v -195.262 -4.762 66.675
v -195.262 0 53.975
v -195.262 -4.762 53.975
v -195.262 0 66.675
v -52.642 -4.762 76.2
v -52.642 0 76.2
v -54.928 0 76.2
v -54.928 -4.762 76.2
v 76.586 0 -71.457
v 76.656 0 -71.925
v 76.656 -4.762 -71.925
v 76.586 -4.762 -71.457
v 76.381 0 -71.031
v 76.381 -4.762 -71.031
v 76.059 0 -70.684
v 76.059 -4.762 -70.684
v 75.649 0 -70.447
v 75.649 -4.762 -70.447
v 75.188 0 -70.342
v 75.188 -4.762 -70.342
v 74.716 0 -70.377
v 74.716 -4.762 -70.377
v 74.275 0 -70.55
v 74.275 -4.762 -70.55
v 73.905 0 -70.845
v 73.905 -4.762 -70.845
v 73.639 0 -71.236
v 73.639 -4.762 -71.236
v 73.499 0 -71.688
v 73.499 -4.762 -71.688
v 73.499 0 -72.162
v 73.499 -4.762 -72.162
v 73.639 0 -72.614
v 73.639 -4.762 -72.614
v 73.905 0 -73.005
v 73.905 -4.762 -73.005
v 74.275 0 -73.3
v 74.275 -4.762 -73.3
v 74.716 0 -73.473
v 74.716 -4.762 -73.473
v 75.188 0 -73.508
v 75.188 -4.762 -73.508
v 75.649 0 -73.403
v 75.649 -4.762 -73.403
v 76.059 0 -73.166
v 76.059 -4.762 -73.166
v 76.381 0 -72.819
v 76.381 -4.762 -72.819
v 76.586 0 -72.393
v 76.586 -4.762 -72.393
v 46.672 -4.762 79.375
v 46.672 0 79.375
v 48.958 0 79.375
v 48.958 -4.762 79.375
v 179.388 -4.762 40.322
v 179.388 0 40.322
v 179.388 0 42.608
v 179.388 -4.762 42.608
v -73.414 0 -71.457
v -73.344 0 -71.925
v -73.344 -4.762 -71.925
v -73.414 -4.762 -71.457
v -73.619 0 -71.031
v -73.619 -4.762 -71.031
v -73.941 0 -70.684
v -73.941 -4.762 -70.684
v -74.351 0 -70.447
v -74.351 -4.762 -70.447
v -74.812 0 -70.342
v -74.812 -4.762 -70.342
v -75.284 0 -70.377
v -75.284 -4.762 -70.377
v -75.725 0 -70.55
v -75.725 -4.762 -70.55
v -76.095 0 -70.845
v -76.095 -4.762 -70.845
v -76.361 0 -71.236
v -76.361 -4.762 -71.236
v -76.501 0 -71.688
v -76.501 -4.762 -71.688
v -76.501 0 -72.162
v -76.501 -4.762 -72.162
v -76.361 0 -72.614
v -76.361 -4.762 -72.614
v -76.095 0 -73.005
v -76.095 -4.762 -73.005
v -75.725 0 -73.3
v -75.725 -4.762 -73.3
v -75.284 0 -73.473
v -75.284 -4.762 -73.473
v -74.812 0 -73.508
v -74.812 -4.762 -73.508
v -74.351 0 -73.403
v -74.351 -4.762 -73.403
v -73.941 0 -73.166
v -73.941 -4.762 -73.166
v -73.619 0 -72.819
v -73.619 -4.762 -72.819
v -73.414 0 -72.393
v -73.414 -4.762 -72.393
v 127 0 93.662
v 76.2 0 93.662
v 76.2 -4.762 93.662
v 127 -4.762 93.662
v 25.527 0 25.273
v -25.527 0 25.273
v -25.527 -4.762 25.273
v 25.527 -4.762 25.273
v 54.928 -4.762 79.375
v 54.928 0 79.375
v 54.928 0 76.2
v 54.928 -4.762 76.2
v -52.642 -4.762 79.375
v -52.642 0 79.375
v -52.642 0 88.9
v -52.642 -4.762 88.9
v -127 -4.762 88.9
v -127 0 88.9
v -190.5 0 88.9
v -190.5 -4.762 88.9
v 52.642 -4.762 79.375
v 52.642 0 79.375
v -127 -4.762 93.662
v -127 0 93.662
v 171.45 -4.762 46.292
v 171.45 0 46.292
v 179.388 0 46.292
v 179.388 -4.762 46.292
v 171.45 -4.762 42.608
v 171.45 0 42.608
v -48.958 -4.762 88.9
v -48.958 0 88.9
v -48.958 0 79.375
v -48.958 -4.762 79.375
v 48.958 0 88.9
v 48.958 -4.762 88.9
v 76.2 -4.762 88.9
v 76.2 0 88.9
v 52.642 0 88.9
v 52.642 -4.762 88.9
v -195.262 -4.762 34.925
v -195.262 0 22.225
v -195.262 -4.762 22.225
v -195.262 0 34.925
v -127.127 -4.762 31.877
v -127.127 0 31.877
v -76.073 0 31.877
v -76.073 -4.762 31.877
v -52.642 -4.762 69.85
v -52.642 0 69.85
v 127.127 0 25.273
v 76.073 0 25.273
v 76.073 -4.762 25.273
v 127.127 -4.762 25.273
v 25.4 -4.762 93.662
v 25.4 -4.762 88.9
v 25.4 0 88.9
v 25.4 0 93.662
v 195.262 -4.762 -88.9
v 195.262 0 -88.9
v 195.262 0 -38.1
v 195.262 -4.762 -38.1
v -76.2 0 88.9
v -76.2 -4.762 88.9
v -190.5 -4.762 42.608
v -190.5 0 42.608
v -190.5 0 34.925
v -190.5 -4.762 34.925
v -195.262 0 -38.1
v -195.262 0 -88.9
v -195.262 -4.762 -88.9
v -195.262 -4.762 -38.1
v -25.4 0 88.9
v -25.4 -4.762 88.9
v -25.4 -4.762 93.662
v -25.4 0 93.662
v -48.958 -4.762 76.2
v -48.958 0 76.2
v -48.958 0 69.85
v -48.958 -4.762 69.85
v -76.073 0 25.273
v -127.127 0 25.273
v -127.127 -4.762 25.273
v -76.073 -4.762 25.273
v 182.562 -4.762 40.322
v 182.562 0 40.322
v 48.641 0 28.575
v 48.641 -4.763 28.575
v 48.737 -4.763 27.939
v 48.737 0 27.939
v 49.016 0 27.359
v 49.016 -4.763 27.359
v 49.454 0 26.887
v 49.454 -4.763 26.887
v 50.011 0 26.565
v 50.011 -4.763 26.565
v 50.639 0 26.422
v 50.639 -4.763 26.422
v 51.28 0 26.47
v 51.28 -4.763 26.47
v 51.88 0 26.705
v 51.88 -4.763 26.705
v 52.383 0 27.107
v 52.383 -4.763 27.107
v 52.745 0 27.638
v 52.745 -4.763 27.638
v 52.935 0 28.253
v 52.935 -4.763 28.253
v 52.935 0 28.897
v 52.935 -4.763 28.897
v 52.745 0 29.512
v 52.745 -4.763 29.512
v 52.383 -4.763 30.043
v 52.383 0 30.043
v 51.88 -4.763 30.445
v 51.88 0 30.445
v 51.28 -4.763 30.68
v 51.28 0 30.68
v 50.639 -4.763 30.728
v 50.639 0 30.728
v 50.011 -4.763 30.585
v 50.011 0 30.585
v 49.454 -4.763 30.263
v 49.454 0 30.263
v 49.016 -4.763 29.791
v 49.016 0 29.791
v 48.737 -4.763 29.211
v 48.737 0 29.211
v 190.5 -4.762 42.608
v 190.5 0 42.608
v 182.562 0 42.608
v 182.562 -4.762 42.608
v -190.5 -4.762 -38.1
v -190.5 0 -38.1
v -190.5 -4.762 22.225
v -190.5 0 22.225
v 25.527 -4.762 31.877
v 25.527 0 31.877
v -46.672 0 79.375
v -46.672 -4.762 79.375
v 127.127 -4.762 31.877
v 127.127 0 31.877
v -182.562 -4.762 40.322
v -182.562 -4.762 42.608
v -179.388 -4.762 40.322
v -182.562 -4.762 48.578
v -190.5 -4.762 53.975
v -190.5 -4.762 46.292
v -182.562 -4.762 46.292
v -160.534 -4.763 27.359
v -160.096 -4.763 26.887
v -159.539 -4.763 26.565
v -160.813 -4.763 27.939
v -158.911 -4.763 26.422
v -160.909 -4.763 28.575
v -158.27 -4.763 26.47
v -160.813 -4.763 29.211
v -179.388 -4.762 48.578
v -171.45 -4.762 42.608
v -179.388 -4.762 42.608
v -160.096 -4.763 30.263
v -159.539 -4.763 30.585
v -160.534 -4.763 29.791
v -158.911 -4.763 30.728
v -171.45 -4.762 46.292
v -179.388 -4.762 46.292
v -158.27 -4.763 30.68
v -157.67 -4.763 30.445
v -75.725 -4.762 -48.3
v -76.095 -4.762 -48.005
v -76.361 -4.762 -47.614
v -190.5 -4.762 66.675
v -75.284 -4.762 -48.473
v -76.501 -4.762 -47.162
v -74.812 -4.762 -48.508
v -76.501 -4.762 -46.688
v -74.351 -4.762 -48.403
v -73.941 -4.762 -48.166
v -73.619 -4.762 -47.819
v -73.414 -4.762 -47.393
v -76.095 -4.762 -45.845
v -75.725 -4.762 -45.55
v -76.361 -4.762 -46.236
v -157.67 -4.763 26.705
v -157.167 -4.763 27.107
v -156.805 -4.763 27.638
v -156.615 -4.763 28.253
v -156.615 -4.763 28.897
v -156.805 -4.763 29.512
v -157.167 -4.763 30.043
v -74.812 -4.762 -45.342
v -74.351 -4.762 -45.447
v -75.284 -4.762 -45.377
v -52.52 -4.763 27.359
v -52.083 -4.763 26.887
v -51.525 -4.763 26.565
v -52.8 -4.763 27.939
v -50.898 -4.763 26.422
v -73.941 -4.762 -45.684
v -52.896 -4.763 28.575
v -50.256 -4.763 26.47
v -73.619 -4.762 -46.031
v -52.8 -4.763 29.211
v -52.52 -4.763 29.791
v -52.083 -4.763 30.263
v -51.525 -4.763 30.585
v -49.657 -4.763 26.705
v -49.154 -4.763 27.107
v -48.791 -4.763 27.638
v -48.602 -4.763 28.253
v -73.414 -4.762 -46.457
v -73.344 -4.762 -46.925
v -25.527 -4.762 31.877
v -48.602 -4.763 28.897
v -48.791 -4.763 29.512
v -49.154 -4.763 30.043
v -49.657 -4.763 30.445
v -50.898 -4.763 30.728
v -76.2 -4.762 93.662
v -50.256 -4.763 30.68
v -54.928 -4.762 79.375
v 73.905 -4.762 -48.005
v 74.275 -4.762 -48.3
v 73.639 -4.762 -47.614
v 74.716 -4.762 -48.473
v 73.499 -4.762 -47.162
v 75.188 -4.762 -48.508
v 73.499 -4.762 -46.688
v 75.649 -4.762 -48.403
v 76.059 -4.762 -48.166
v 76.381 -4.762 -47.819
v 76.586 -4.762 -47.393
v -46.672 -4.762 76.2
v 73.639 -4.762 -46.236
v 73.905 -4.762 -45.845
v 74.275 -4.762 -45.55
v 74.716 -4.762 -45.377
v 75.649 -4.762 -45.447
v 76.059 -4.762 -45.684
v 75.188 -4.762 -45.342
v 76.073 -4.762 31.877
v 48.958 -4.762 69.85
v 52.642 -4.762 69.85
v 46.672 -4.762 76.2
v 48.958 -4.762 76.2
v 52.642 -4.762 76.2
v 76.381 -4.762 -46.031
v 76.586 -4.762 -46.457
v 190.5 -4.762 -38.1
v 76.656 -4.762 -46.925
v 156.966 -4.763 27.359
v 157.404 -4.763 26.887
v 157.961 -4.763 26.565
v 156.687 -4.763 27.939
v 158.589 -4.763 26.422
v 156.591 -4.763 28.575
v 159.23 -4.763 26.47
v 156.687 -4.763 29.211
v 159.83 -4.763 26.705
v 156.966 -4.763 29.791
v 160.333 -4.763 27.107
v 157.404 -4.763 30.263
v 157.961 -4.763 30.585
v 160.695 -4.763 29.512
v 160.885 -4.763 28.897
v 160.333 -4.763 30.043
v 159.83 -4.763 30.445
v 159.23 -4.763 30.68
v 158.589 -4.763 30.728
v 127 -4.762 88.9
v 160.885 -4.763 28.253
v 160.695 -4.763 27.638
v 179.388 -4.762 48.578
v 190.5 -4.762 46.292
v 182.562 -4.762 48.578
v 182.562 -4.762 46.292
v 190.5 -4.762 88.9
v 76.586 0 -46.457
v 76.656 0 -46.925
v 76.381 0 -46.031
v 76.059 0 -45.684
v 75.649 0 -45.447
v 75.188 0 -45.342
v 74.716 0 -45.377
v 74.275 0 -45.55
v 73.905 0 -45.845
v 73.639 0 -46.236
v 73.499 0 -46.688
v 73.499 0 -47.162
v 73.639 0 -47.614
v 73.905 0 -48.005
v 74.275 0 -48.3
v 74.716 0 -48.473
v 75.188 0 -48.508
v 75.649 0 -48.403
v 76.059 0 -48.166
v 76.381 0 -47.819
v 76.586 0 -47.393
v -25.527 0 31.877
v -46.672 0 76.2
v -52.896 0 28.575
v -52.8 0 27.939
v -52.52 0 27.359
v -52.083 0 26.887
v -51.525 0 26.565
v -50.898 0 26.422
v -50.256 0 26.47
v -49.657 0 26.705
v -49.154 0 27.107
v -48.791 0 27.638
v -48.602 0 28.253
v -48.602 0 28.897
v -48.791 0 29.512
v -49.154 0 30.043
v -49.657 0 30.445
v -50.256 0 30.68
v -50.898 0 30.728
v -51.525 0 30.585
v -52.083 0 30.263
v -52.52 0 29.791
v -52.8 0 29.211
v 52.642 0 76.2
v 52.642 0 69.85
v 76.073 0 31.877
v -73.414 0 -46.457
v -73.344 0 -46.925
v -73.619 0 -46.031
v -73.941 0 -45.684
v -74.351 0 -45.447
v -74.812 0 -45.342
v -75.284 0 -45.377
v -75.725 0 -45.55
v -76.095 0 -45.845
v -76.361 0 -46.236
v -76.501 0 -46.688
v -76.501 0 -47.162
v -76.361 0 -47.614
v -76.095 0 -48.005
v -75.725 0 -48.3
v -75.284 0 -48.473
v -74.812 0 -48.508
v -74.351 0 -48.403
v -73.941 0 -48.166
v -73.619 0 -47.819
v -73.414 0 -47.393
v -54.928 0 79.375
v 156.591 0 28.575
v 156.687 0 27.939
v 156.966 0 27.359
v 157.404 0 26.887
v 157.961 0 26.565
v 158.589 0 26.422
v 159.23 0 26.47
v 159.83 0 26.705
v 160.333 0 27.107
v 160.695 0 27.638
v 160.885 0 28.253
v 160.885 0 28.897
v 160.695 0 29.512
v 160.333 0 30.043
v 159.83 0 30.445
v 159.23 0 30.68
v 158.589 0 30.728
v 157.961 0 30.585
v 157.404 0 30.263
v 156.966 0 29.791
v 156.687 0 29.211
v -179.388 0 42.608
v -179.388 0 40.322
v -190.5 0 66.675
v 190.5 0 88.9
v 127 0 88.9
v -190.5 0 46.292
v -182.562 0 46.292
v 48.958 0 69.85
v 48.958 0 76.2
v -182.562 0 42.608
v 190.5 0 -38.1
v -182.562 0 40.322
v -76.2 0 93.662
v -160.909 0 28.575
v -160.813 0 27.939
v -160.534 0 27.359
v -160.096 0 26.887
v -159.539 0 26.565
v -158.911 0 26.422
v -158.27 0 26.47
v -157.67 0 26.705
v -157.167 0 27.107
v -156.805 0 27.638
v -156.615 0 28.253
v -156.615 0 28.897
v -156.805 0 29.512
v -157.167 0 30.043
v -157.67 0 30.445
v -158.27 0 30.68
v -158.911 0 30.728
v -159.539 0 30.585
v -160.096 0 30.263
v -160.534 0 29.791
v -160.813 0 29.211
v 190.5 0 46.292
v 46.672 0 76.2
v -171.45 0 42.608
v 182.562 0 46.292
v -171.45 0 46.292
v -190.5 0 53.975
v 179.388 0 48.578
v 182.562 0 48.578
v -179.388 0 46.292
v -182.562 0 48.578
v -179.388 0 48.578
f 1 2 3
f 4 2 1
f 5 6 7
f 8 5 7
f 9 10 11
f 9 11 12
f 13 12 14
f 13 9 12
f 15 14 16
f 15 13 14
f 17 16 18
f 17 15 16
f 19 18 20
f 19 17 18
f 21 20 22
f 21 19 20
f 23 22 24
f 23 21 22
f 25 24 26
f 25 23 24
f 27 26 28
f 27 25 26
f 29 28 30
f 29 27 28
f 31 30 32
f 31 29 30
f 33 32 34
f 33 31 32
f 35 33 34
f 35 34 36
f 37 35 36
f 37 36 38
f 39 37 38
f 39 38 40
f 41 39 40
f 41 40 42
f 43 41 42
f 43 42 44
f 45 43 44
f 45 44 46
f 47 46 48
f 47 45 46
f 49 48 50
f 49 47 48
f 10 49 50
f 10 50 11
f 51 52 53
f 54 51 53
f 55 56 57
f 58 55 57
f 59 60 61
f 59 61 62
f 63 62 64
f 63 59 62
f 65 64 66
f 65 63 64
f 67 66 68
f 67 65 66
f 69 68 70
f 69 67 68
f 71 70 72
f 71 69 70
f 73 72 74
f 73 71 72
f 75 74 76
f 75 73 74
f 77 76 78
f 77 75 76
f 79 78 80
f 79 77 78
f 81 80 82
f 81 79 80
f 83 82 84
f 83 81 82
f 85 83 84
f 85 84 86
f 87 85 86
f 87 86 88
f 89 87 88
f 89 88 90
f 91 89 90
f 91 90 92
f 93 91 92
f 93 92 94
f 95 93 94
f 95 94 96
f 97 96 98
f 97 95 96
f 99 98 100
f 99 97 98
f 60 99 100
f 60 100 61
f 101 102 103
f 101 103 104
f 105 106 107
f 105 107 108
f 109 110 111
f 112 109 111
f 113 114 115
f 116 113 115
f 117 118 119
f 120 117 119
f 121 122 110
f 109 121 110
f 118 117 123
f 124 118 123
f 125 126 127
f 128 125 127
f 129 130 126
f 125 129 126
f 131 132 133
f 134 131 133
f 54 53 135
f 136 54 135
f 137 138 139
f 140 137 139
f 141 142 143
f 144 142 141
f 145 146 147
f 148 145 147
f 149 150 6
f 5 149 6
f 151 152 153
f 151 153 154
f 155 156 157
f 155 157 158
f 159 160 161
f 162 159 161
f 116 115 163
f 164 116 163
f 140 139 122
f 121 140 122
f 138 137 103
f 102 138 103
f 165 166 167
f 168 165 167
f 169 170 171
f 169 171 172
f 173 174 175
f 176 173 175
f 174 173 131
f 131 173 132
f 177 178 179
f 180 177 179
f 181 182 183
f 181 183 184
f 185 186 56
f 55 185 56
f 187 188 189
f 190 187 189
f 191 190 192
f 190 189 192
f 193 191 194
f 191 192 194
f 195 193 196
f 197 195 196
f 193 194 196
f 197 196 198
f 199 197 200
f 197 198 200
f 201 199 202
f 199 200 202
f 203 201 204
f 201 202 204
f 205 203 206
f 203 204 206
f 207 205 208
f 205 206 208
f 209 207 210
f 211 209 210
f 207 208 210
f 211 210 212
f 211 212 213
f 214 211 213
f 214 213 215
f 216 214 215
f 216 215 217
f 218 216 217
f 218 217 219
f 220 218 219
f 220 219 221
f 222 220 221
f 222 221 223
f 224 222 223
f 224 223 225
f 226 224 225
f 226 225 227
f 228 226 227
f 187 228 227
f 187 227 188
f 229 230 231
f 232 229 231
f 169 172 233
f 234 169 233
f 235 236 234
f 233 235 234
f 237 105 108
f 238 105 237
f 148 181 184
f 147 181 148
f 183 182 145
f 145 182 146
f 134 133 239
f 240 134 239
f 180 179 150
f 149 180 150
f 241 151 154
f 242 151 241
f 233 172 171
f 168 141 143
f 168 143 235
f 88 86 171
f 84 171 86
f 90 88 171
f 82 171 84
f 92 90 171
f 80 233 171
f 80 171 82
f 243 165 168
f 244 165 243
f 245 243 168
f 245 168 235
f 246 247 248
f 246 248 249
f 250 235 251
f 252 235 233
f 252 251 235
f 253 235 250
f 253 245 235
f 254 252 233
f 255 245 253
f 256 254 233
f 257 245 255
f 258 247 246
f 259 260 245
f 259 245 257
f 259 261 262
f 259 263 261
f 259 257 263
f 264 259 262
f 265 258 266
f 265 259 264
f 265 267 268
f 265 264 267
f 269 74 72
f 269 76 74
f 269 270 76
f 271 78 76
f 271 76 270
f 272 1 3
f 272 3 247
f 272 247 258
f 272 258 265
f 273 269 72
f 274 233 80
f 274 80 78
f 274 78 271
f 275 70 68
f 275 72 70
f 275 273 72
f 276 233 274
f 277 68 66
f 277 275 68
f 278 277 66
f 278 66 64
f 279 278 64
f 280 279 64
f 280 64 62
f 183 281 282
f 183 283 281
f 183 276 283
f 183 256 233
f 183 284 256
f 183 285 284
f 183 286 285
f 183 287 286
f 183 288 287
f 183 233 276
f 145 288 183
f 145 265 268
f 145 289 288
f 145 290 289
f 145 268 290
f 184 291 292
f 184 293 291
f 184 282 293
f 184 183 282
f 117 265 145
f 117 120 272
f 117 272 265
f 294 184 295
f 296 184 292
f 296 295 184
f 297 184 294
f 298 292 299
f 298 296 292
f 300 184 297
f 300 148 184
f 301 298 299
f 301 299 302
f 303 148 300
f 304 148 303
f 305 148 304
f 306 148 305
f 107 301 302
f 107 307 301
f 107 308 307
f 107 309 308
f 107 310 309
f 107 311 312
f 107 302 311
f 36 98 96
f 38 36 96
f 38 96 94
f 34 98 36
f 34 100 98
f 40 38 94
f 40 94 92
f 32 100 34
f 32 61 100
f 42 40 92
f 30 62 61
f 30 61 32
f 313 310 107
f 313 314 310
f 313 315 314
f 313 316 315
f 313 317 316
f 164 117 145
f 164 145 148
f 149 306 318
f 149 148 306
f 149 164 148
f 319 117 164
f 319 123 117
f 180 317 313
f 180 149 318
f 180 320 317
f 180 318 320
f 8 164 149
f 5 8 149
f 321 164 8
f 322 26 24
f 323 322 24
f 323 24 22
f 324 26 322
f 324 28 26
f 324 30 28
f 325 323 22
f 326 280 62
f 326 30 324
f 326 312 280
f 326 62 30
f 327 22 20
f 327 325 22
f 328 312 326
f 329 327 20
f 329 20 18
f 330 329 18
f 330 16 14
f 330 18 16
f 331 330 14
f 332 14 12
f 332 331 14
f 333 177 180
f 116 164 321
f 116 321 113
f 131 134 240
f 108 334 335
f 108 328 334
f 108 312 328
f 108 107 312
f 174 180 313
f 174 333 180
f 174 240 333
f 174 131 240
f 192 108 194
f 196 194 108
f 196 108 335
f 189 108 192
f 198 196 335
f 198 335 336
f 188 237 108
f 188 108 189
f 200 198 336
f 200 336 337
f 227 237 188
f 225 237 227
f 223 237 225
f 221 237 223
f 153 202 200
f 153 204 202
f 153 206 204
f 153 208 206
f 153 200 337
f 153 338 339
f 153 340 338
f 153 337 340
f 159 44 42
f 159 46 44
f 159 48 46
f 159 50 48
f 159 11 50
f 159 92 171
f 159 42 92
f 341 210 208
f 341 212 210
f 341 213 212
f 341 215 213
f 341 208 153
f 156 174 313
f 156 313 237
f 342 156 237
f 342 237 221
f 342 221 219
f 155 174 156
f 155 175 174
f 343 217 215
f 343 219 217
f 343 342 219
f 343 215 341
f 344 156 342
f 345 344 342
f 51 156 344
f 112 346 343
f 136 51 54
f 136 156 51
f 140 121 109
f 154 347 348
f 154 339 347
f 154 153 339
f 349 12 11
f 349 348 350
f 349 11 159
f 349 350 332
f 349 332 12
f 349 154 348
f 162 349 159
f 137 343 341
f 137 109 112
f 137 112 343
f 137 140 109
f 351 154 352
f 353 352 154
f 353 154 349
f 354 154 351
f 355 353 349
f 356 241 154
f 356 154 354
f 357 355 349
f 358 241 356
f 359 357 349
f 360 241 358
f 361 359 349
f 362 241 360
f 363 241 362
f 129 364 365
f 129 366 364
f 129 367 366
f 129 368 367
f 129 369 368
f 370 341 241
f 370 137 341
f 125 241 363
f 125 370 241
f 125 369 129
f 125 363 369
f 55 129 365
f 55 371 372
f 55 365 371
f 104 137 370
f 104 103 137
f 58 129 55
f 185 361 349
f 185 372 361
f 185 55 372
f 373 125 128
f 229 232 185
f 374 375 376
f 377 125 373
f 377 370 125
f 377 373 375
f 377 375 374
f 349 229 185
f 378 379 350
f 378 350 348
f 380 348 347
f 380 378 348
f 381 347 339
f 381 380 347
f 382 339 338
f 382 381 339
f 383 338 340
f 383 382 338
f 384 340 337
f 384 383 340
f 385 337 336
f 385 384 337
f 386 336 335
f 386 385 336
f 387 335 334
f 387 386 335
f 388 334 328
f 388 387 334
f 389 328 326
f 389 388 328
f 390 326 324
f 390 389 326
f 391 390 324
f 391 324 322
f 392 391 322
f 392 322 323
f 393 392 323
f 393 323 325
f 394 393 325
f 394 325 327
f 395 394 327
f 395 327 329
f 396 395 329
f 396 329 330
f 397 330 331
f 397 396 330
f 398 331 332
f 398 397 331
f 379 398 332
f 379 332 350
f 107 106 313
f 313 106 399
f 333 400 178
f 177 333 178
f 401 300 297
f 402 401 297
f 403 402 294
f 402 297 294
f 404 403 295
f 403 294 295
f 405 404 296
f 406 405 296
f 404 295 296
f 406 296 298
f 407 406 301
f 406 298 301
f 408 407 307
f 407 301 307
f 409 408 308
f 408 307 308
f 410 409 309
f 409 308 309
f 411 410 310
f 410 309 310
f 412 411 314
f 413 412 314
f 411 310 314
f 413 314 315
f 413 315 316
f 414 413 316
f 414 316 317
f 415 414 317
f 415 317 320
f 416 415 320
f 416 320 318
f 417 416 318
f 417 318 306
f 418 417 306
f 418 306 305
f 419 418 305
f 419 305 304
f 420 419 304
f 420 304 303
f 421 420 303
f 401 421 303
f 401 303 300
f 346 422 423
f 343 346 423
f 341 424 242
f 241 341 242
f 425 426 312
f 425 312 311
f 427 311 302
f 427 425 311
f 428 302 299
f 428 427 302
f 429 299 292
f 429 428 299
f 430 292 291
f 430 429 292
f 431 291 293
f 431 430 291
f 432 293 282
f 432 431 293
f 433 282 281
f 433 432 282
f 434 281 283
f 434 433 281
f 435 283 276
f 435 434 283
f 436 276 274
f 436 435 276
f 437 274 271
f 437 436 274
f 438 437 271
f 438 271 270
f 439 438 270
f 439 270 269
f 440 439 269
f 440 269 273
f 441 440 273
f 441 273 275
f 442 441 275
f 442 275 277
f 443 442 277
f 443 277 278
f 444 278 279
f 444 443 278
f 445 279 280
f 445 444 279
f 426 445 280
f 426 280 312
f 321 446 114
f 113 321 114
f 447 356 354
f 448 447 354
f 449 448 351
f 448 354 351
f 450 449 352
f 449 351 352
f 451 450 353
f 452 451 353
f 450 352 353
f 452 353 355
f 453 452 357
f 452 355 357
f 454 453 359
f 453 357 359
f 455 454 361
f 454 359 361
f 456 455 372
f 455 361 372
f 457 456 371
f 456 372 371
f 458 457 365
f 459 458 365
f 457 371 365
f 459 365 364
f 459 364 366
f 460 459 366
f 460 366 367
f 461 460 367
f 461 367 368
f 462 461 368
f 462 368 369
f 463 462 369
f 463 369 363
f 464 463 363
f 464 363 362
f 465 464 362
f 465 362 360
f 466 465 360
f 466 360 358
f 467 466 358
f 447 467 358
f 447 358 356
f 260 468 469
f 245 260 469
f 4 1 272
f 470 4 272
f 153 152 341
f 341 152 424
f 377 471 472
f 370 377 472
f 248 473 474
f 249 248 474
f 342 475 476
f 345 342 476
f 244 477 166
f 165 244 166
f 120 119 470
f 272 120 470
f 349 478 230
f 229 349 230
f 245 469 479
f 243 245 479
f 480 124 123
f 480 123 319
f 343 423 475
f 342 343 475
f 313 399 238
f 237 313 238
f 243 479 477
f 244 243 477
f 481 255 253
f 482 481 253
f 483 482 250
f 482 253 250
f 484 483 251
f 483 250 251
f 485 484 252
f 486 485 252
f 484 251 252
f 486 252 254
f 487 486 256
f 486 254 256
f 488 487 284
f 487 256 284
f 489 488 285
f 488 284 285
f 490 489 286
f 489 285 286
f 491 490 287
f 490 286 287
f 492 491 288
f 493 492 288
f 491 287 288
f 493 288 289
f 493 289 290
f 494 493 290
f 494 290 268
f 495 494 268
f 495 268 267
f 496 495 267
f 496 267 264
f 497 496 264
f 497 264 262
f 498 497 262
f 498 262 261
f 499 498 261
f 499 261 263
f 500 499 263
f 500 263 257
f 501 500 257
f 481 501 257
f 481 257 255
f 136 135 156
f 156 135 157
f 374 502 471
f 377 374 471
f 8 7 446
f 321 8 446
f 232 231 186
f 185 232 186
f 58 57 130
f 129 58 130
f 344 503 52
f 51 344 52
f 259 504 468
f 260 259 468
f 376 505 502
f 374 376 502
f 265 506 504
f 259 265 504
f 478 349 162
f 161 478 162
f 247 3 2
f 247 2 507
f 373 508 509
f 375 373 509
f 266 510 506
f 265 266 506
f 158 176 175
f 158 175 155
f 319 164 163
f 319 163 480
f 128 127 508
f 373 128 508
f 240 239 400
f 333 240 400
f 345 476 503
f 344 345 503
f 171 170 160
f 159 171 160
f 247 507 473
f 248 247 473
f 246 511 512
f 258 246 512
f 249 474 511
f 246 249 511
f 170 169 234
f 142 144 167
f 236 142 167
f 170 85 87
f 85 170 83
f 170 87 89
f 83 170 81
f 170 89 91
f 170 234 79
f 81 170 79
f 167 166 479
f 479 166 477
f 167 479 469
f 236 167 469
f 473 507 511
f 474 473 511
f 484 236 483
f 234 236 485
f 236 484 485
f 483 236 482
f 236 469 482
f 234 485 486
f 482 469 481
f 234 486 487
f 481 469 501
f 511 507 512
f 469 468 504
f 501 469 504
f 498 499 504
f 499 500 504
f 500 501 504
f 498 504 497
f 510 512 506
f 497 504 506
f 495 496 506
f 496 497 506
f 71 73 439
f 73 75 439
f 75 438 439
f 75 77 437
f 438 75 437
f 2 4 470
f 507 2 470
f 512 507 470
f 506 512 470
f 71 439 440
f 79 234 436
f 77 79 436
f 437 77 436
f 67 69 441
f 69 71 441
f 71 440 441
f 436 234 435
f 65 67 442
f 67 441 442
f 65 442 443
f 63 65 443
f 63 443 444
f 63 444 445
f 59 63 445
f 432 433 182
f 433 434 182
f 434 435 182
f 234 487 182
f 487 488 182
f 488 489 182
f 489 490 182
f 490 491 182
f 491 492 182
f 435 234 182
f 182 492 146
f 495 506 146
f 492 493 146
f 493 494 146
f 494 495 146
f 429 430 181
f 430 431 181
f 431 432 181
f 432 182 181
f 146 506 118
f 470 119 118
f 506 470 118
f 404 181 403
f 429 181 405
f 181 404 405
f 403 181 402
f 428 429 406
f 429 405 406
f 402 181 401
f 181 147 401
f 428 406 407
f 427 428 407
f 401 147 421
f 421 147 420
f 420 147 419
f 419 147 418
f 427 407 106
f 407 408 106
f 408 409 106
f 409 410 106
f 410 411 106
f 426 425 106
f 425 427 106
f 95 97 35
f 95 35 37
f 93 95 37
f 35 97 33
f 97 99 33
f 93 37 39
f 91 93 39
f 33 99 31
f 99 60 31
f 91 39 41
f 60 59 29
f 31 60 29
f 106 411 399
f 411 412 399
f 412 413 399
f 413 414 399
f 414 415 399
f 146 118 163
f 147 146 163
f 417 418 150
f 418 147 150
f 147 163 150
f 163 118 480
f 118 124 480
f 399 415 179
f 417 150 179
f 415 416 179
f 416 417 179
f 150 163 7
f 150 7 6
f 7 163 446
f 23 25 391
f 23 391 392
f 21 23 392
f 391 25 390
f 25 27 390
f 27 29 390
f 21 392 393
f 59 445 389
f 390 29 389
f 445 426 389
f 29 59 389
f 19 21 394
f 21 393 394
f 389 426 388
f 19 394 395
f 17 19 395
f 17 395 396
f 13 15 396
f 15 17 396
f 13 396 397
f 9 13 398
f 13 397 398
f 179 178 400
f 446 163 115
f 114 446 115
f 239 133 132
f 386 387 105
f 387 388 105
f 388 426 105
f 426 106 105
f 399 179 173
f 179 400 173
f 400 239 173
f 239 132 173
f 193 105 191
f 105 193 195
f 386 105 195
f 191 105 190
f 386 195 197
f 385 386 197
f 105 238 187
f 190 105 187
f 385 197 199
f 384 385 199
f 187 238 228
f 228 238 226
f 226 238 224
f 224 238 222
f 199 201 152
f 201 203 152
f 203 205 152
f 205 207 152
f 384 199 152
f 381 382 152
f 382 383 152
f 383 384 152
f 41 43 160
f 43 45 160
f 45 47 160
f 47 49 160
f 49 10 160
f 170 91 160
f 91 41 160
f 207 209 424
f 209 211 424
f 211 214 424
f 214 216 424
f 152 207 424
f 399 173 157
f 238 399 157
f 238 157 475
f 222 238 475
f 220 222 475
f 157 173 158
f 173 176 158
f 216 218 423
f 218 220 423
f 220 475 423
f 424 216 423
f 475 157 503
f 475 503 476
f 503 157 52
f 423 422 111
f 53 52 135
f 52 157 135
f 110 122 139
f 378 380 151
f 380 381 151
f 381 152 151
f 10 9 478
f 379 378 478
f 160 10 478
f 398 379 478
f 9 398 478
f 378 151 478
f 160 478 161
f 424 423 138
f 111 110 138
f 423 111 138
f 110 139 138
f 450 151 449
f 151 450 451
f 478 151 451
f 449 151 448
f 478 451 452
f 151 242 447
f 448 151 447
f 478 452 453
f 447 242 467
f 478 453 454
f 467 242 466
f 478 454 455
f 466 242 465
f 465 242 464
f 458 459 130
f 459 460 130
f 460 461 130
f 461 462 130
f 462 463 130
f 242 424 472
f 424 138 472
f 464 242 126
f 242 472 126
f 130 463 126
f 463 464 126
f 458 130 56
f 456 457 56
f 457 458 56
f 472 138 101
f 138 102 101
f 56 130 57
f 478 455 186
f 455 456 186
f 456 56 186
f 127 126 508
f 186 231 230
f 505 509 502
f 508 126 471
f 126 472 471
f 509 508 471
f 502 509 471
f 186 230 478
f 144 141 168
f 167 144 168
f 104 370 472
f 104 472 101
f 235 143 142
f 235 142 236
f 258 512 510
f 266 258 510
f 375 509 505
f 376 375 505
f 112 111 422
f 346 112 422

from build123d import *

# Parameters (mm, degrees)
F0_R     = 1.5875
F0_W     = 51.054
F0_H     = 6.604
F0_W_2   = 4.7625
F0_H_2   = 50.8
F0_W_3   = 50.8
F0_H_3   = 4.7625
F0_H_4   = 12.7
F1_DEPTH = 4.7625
F2_D     = 4.318
F2_DEPTH = 11.9126
F2_TIP   = 1.2972580765


with BuildPart() as f1:
    # F0 (on Front) → F1 (new body)
    with BuildSketch(Plane.XZ):
        Polygon((-127, 88.9), (-190.5, 88.9), (-190.5, 66.675), (-190.5, 53.975), (-190.5, 46.2915), (-182.5625, 46.2915), (-182.5625, 48.5775), (-179.3875, 48.5775), (-179.3875, 46.2915), (-171.45, 46.2915), (-171.45, 42.6085), (-179.3875, 42.6085), (-179.3875, 40.3225), (-182.5625, 40.3225), (-182.5625, 42.6085), (-190.5, 42.6085), (-190.5, 34.925), (-190.5, 22.225), (-190.5, -38.1), (-190.5, -88.9), (190.5, -88.9), (190.5, -38.1), (190.5, 22.225), (190.5, 34.925), (190.5, 42.6085), (182.5625, 42.6085), (182.5625, 40.3225), (179.3875, 40.3225), (179.3875, 42.6085), (171.45, 42.6085), (171.45, 46.2915), (179.3875, 46.2915), (179.3875, 48.5775), (182.5625, 48.5775), (182.5625, 46.2915), (190.5, 46.2915), (190.5, 53.975), (190.5, 66.675), (190.5, 88.9), (127, 88.9), (76.2, 88.9), (52.6415, 88.9), (52.6415, 79.375), (54.9275, 79.375), (54.9275, 76.2), (52.6415, 76.2), (52.6415, 69.85), (48.9585, 69.85), (48.9585, 76.2), (46.6725, 76.2), (46.6725, 79.375), (48.9585, 79.375), (48.9585, 88.9), (25.4, 88.9), (-25.4, 88.9), (-48.9585, 88.9), (-48.9585, 79.375), (-46.6725, 79.375), (-46.6725, 76.2), (-48.9585, 76.2), (-48.9585, 69.85), (-52.6415, 69.85), (-52.6415, 76.2), (-54.9275, 76.2), (-54.9275, 79.375), (-52.6415, 79.375), (-52.6415, 88.9), (-76.2, 88.9), align=None)
        with Locations((-74.9310097456, -71.9249998569)):
            Circle(F0_R, mode=Mode.SUBTRACT)
        with Locations((-74.9310097456, -46.9249998569)):
            Circle(F0_R, mode=Mode.SUBTRACT)
        with Locations((75.0689902544, -71.9249998569)):
            Circle(F0_R, mode=Mode.SUBTRACT)
        with Locations((75.0689902544, -46.9249998569)):
            Circle(F0_R, mode=Mode.SUBTRACT)
        with Locations((-101.6, 28.575)):
            Rectangle(F0_W, F0_H, mode=Mode.SUBTRACT)
        with Locations((0, 28.575)):
            Rectangle(F0_W, F0_H, mode=Mode.SUBTRACT)
        with Locations((101.6, 28.575)):
            Rectangle(F0_W, F0_H, mode=Mode.SUBTRACT)
        with Locations((192.88125, -63.5)):
            Rectangle(F0_W_2, F0_H_2)
        with Locations((-192.88125, -63.5)):
            Rectangle(F0_W_2, F0_H_2)
        with Locations((-101.6, 91.28125)):
            Rectangle(F0_W_3, F0_H_3)
        with Locations((0, 91.28125)):
            Rectangle(F0_W_3, F0_H_3)
        with Locations((101.6, 91.28125)):
            Rectangle(F0_W_3, F0_H_3)
        with Locations((-192.88125, 60.325)):
            Rectangle(F0_W_2, F0_H_4)
        with Locations((-192.88125, 28.575)):
            Rectangle(F0_W_2, F0_H_4)
    extrude(amount=F1_DEPTH)

    # F2
    with Locations(Plane(origin=(0, 0, 0), x_dir=(1, 0, 0), z_dir=(0, 1, 0))):
        with Locations((-158.75, -28.575), (-50.7365, -28.575), (50.8, -28.575), (158.75, -28.575)):
            Hole(F2_D / 2, depth=F2_DEPTH)
            with Locations((0, 0, -(F2_DEPTH + F2_TIP / 2))):  # 118° drill point
                Cone(0, F2_D / 2, F2_TIP, mode=Mode.SUBTRACT)


solid = f1.part
